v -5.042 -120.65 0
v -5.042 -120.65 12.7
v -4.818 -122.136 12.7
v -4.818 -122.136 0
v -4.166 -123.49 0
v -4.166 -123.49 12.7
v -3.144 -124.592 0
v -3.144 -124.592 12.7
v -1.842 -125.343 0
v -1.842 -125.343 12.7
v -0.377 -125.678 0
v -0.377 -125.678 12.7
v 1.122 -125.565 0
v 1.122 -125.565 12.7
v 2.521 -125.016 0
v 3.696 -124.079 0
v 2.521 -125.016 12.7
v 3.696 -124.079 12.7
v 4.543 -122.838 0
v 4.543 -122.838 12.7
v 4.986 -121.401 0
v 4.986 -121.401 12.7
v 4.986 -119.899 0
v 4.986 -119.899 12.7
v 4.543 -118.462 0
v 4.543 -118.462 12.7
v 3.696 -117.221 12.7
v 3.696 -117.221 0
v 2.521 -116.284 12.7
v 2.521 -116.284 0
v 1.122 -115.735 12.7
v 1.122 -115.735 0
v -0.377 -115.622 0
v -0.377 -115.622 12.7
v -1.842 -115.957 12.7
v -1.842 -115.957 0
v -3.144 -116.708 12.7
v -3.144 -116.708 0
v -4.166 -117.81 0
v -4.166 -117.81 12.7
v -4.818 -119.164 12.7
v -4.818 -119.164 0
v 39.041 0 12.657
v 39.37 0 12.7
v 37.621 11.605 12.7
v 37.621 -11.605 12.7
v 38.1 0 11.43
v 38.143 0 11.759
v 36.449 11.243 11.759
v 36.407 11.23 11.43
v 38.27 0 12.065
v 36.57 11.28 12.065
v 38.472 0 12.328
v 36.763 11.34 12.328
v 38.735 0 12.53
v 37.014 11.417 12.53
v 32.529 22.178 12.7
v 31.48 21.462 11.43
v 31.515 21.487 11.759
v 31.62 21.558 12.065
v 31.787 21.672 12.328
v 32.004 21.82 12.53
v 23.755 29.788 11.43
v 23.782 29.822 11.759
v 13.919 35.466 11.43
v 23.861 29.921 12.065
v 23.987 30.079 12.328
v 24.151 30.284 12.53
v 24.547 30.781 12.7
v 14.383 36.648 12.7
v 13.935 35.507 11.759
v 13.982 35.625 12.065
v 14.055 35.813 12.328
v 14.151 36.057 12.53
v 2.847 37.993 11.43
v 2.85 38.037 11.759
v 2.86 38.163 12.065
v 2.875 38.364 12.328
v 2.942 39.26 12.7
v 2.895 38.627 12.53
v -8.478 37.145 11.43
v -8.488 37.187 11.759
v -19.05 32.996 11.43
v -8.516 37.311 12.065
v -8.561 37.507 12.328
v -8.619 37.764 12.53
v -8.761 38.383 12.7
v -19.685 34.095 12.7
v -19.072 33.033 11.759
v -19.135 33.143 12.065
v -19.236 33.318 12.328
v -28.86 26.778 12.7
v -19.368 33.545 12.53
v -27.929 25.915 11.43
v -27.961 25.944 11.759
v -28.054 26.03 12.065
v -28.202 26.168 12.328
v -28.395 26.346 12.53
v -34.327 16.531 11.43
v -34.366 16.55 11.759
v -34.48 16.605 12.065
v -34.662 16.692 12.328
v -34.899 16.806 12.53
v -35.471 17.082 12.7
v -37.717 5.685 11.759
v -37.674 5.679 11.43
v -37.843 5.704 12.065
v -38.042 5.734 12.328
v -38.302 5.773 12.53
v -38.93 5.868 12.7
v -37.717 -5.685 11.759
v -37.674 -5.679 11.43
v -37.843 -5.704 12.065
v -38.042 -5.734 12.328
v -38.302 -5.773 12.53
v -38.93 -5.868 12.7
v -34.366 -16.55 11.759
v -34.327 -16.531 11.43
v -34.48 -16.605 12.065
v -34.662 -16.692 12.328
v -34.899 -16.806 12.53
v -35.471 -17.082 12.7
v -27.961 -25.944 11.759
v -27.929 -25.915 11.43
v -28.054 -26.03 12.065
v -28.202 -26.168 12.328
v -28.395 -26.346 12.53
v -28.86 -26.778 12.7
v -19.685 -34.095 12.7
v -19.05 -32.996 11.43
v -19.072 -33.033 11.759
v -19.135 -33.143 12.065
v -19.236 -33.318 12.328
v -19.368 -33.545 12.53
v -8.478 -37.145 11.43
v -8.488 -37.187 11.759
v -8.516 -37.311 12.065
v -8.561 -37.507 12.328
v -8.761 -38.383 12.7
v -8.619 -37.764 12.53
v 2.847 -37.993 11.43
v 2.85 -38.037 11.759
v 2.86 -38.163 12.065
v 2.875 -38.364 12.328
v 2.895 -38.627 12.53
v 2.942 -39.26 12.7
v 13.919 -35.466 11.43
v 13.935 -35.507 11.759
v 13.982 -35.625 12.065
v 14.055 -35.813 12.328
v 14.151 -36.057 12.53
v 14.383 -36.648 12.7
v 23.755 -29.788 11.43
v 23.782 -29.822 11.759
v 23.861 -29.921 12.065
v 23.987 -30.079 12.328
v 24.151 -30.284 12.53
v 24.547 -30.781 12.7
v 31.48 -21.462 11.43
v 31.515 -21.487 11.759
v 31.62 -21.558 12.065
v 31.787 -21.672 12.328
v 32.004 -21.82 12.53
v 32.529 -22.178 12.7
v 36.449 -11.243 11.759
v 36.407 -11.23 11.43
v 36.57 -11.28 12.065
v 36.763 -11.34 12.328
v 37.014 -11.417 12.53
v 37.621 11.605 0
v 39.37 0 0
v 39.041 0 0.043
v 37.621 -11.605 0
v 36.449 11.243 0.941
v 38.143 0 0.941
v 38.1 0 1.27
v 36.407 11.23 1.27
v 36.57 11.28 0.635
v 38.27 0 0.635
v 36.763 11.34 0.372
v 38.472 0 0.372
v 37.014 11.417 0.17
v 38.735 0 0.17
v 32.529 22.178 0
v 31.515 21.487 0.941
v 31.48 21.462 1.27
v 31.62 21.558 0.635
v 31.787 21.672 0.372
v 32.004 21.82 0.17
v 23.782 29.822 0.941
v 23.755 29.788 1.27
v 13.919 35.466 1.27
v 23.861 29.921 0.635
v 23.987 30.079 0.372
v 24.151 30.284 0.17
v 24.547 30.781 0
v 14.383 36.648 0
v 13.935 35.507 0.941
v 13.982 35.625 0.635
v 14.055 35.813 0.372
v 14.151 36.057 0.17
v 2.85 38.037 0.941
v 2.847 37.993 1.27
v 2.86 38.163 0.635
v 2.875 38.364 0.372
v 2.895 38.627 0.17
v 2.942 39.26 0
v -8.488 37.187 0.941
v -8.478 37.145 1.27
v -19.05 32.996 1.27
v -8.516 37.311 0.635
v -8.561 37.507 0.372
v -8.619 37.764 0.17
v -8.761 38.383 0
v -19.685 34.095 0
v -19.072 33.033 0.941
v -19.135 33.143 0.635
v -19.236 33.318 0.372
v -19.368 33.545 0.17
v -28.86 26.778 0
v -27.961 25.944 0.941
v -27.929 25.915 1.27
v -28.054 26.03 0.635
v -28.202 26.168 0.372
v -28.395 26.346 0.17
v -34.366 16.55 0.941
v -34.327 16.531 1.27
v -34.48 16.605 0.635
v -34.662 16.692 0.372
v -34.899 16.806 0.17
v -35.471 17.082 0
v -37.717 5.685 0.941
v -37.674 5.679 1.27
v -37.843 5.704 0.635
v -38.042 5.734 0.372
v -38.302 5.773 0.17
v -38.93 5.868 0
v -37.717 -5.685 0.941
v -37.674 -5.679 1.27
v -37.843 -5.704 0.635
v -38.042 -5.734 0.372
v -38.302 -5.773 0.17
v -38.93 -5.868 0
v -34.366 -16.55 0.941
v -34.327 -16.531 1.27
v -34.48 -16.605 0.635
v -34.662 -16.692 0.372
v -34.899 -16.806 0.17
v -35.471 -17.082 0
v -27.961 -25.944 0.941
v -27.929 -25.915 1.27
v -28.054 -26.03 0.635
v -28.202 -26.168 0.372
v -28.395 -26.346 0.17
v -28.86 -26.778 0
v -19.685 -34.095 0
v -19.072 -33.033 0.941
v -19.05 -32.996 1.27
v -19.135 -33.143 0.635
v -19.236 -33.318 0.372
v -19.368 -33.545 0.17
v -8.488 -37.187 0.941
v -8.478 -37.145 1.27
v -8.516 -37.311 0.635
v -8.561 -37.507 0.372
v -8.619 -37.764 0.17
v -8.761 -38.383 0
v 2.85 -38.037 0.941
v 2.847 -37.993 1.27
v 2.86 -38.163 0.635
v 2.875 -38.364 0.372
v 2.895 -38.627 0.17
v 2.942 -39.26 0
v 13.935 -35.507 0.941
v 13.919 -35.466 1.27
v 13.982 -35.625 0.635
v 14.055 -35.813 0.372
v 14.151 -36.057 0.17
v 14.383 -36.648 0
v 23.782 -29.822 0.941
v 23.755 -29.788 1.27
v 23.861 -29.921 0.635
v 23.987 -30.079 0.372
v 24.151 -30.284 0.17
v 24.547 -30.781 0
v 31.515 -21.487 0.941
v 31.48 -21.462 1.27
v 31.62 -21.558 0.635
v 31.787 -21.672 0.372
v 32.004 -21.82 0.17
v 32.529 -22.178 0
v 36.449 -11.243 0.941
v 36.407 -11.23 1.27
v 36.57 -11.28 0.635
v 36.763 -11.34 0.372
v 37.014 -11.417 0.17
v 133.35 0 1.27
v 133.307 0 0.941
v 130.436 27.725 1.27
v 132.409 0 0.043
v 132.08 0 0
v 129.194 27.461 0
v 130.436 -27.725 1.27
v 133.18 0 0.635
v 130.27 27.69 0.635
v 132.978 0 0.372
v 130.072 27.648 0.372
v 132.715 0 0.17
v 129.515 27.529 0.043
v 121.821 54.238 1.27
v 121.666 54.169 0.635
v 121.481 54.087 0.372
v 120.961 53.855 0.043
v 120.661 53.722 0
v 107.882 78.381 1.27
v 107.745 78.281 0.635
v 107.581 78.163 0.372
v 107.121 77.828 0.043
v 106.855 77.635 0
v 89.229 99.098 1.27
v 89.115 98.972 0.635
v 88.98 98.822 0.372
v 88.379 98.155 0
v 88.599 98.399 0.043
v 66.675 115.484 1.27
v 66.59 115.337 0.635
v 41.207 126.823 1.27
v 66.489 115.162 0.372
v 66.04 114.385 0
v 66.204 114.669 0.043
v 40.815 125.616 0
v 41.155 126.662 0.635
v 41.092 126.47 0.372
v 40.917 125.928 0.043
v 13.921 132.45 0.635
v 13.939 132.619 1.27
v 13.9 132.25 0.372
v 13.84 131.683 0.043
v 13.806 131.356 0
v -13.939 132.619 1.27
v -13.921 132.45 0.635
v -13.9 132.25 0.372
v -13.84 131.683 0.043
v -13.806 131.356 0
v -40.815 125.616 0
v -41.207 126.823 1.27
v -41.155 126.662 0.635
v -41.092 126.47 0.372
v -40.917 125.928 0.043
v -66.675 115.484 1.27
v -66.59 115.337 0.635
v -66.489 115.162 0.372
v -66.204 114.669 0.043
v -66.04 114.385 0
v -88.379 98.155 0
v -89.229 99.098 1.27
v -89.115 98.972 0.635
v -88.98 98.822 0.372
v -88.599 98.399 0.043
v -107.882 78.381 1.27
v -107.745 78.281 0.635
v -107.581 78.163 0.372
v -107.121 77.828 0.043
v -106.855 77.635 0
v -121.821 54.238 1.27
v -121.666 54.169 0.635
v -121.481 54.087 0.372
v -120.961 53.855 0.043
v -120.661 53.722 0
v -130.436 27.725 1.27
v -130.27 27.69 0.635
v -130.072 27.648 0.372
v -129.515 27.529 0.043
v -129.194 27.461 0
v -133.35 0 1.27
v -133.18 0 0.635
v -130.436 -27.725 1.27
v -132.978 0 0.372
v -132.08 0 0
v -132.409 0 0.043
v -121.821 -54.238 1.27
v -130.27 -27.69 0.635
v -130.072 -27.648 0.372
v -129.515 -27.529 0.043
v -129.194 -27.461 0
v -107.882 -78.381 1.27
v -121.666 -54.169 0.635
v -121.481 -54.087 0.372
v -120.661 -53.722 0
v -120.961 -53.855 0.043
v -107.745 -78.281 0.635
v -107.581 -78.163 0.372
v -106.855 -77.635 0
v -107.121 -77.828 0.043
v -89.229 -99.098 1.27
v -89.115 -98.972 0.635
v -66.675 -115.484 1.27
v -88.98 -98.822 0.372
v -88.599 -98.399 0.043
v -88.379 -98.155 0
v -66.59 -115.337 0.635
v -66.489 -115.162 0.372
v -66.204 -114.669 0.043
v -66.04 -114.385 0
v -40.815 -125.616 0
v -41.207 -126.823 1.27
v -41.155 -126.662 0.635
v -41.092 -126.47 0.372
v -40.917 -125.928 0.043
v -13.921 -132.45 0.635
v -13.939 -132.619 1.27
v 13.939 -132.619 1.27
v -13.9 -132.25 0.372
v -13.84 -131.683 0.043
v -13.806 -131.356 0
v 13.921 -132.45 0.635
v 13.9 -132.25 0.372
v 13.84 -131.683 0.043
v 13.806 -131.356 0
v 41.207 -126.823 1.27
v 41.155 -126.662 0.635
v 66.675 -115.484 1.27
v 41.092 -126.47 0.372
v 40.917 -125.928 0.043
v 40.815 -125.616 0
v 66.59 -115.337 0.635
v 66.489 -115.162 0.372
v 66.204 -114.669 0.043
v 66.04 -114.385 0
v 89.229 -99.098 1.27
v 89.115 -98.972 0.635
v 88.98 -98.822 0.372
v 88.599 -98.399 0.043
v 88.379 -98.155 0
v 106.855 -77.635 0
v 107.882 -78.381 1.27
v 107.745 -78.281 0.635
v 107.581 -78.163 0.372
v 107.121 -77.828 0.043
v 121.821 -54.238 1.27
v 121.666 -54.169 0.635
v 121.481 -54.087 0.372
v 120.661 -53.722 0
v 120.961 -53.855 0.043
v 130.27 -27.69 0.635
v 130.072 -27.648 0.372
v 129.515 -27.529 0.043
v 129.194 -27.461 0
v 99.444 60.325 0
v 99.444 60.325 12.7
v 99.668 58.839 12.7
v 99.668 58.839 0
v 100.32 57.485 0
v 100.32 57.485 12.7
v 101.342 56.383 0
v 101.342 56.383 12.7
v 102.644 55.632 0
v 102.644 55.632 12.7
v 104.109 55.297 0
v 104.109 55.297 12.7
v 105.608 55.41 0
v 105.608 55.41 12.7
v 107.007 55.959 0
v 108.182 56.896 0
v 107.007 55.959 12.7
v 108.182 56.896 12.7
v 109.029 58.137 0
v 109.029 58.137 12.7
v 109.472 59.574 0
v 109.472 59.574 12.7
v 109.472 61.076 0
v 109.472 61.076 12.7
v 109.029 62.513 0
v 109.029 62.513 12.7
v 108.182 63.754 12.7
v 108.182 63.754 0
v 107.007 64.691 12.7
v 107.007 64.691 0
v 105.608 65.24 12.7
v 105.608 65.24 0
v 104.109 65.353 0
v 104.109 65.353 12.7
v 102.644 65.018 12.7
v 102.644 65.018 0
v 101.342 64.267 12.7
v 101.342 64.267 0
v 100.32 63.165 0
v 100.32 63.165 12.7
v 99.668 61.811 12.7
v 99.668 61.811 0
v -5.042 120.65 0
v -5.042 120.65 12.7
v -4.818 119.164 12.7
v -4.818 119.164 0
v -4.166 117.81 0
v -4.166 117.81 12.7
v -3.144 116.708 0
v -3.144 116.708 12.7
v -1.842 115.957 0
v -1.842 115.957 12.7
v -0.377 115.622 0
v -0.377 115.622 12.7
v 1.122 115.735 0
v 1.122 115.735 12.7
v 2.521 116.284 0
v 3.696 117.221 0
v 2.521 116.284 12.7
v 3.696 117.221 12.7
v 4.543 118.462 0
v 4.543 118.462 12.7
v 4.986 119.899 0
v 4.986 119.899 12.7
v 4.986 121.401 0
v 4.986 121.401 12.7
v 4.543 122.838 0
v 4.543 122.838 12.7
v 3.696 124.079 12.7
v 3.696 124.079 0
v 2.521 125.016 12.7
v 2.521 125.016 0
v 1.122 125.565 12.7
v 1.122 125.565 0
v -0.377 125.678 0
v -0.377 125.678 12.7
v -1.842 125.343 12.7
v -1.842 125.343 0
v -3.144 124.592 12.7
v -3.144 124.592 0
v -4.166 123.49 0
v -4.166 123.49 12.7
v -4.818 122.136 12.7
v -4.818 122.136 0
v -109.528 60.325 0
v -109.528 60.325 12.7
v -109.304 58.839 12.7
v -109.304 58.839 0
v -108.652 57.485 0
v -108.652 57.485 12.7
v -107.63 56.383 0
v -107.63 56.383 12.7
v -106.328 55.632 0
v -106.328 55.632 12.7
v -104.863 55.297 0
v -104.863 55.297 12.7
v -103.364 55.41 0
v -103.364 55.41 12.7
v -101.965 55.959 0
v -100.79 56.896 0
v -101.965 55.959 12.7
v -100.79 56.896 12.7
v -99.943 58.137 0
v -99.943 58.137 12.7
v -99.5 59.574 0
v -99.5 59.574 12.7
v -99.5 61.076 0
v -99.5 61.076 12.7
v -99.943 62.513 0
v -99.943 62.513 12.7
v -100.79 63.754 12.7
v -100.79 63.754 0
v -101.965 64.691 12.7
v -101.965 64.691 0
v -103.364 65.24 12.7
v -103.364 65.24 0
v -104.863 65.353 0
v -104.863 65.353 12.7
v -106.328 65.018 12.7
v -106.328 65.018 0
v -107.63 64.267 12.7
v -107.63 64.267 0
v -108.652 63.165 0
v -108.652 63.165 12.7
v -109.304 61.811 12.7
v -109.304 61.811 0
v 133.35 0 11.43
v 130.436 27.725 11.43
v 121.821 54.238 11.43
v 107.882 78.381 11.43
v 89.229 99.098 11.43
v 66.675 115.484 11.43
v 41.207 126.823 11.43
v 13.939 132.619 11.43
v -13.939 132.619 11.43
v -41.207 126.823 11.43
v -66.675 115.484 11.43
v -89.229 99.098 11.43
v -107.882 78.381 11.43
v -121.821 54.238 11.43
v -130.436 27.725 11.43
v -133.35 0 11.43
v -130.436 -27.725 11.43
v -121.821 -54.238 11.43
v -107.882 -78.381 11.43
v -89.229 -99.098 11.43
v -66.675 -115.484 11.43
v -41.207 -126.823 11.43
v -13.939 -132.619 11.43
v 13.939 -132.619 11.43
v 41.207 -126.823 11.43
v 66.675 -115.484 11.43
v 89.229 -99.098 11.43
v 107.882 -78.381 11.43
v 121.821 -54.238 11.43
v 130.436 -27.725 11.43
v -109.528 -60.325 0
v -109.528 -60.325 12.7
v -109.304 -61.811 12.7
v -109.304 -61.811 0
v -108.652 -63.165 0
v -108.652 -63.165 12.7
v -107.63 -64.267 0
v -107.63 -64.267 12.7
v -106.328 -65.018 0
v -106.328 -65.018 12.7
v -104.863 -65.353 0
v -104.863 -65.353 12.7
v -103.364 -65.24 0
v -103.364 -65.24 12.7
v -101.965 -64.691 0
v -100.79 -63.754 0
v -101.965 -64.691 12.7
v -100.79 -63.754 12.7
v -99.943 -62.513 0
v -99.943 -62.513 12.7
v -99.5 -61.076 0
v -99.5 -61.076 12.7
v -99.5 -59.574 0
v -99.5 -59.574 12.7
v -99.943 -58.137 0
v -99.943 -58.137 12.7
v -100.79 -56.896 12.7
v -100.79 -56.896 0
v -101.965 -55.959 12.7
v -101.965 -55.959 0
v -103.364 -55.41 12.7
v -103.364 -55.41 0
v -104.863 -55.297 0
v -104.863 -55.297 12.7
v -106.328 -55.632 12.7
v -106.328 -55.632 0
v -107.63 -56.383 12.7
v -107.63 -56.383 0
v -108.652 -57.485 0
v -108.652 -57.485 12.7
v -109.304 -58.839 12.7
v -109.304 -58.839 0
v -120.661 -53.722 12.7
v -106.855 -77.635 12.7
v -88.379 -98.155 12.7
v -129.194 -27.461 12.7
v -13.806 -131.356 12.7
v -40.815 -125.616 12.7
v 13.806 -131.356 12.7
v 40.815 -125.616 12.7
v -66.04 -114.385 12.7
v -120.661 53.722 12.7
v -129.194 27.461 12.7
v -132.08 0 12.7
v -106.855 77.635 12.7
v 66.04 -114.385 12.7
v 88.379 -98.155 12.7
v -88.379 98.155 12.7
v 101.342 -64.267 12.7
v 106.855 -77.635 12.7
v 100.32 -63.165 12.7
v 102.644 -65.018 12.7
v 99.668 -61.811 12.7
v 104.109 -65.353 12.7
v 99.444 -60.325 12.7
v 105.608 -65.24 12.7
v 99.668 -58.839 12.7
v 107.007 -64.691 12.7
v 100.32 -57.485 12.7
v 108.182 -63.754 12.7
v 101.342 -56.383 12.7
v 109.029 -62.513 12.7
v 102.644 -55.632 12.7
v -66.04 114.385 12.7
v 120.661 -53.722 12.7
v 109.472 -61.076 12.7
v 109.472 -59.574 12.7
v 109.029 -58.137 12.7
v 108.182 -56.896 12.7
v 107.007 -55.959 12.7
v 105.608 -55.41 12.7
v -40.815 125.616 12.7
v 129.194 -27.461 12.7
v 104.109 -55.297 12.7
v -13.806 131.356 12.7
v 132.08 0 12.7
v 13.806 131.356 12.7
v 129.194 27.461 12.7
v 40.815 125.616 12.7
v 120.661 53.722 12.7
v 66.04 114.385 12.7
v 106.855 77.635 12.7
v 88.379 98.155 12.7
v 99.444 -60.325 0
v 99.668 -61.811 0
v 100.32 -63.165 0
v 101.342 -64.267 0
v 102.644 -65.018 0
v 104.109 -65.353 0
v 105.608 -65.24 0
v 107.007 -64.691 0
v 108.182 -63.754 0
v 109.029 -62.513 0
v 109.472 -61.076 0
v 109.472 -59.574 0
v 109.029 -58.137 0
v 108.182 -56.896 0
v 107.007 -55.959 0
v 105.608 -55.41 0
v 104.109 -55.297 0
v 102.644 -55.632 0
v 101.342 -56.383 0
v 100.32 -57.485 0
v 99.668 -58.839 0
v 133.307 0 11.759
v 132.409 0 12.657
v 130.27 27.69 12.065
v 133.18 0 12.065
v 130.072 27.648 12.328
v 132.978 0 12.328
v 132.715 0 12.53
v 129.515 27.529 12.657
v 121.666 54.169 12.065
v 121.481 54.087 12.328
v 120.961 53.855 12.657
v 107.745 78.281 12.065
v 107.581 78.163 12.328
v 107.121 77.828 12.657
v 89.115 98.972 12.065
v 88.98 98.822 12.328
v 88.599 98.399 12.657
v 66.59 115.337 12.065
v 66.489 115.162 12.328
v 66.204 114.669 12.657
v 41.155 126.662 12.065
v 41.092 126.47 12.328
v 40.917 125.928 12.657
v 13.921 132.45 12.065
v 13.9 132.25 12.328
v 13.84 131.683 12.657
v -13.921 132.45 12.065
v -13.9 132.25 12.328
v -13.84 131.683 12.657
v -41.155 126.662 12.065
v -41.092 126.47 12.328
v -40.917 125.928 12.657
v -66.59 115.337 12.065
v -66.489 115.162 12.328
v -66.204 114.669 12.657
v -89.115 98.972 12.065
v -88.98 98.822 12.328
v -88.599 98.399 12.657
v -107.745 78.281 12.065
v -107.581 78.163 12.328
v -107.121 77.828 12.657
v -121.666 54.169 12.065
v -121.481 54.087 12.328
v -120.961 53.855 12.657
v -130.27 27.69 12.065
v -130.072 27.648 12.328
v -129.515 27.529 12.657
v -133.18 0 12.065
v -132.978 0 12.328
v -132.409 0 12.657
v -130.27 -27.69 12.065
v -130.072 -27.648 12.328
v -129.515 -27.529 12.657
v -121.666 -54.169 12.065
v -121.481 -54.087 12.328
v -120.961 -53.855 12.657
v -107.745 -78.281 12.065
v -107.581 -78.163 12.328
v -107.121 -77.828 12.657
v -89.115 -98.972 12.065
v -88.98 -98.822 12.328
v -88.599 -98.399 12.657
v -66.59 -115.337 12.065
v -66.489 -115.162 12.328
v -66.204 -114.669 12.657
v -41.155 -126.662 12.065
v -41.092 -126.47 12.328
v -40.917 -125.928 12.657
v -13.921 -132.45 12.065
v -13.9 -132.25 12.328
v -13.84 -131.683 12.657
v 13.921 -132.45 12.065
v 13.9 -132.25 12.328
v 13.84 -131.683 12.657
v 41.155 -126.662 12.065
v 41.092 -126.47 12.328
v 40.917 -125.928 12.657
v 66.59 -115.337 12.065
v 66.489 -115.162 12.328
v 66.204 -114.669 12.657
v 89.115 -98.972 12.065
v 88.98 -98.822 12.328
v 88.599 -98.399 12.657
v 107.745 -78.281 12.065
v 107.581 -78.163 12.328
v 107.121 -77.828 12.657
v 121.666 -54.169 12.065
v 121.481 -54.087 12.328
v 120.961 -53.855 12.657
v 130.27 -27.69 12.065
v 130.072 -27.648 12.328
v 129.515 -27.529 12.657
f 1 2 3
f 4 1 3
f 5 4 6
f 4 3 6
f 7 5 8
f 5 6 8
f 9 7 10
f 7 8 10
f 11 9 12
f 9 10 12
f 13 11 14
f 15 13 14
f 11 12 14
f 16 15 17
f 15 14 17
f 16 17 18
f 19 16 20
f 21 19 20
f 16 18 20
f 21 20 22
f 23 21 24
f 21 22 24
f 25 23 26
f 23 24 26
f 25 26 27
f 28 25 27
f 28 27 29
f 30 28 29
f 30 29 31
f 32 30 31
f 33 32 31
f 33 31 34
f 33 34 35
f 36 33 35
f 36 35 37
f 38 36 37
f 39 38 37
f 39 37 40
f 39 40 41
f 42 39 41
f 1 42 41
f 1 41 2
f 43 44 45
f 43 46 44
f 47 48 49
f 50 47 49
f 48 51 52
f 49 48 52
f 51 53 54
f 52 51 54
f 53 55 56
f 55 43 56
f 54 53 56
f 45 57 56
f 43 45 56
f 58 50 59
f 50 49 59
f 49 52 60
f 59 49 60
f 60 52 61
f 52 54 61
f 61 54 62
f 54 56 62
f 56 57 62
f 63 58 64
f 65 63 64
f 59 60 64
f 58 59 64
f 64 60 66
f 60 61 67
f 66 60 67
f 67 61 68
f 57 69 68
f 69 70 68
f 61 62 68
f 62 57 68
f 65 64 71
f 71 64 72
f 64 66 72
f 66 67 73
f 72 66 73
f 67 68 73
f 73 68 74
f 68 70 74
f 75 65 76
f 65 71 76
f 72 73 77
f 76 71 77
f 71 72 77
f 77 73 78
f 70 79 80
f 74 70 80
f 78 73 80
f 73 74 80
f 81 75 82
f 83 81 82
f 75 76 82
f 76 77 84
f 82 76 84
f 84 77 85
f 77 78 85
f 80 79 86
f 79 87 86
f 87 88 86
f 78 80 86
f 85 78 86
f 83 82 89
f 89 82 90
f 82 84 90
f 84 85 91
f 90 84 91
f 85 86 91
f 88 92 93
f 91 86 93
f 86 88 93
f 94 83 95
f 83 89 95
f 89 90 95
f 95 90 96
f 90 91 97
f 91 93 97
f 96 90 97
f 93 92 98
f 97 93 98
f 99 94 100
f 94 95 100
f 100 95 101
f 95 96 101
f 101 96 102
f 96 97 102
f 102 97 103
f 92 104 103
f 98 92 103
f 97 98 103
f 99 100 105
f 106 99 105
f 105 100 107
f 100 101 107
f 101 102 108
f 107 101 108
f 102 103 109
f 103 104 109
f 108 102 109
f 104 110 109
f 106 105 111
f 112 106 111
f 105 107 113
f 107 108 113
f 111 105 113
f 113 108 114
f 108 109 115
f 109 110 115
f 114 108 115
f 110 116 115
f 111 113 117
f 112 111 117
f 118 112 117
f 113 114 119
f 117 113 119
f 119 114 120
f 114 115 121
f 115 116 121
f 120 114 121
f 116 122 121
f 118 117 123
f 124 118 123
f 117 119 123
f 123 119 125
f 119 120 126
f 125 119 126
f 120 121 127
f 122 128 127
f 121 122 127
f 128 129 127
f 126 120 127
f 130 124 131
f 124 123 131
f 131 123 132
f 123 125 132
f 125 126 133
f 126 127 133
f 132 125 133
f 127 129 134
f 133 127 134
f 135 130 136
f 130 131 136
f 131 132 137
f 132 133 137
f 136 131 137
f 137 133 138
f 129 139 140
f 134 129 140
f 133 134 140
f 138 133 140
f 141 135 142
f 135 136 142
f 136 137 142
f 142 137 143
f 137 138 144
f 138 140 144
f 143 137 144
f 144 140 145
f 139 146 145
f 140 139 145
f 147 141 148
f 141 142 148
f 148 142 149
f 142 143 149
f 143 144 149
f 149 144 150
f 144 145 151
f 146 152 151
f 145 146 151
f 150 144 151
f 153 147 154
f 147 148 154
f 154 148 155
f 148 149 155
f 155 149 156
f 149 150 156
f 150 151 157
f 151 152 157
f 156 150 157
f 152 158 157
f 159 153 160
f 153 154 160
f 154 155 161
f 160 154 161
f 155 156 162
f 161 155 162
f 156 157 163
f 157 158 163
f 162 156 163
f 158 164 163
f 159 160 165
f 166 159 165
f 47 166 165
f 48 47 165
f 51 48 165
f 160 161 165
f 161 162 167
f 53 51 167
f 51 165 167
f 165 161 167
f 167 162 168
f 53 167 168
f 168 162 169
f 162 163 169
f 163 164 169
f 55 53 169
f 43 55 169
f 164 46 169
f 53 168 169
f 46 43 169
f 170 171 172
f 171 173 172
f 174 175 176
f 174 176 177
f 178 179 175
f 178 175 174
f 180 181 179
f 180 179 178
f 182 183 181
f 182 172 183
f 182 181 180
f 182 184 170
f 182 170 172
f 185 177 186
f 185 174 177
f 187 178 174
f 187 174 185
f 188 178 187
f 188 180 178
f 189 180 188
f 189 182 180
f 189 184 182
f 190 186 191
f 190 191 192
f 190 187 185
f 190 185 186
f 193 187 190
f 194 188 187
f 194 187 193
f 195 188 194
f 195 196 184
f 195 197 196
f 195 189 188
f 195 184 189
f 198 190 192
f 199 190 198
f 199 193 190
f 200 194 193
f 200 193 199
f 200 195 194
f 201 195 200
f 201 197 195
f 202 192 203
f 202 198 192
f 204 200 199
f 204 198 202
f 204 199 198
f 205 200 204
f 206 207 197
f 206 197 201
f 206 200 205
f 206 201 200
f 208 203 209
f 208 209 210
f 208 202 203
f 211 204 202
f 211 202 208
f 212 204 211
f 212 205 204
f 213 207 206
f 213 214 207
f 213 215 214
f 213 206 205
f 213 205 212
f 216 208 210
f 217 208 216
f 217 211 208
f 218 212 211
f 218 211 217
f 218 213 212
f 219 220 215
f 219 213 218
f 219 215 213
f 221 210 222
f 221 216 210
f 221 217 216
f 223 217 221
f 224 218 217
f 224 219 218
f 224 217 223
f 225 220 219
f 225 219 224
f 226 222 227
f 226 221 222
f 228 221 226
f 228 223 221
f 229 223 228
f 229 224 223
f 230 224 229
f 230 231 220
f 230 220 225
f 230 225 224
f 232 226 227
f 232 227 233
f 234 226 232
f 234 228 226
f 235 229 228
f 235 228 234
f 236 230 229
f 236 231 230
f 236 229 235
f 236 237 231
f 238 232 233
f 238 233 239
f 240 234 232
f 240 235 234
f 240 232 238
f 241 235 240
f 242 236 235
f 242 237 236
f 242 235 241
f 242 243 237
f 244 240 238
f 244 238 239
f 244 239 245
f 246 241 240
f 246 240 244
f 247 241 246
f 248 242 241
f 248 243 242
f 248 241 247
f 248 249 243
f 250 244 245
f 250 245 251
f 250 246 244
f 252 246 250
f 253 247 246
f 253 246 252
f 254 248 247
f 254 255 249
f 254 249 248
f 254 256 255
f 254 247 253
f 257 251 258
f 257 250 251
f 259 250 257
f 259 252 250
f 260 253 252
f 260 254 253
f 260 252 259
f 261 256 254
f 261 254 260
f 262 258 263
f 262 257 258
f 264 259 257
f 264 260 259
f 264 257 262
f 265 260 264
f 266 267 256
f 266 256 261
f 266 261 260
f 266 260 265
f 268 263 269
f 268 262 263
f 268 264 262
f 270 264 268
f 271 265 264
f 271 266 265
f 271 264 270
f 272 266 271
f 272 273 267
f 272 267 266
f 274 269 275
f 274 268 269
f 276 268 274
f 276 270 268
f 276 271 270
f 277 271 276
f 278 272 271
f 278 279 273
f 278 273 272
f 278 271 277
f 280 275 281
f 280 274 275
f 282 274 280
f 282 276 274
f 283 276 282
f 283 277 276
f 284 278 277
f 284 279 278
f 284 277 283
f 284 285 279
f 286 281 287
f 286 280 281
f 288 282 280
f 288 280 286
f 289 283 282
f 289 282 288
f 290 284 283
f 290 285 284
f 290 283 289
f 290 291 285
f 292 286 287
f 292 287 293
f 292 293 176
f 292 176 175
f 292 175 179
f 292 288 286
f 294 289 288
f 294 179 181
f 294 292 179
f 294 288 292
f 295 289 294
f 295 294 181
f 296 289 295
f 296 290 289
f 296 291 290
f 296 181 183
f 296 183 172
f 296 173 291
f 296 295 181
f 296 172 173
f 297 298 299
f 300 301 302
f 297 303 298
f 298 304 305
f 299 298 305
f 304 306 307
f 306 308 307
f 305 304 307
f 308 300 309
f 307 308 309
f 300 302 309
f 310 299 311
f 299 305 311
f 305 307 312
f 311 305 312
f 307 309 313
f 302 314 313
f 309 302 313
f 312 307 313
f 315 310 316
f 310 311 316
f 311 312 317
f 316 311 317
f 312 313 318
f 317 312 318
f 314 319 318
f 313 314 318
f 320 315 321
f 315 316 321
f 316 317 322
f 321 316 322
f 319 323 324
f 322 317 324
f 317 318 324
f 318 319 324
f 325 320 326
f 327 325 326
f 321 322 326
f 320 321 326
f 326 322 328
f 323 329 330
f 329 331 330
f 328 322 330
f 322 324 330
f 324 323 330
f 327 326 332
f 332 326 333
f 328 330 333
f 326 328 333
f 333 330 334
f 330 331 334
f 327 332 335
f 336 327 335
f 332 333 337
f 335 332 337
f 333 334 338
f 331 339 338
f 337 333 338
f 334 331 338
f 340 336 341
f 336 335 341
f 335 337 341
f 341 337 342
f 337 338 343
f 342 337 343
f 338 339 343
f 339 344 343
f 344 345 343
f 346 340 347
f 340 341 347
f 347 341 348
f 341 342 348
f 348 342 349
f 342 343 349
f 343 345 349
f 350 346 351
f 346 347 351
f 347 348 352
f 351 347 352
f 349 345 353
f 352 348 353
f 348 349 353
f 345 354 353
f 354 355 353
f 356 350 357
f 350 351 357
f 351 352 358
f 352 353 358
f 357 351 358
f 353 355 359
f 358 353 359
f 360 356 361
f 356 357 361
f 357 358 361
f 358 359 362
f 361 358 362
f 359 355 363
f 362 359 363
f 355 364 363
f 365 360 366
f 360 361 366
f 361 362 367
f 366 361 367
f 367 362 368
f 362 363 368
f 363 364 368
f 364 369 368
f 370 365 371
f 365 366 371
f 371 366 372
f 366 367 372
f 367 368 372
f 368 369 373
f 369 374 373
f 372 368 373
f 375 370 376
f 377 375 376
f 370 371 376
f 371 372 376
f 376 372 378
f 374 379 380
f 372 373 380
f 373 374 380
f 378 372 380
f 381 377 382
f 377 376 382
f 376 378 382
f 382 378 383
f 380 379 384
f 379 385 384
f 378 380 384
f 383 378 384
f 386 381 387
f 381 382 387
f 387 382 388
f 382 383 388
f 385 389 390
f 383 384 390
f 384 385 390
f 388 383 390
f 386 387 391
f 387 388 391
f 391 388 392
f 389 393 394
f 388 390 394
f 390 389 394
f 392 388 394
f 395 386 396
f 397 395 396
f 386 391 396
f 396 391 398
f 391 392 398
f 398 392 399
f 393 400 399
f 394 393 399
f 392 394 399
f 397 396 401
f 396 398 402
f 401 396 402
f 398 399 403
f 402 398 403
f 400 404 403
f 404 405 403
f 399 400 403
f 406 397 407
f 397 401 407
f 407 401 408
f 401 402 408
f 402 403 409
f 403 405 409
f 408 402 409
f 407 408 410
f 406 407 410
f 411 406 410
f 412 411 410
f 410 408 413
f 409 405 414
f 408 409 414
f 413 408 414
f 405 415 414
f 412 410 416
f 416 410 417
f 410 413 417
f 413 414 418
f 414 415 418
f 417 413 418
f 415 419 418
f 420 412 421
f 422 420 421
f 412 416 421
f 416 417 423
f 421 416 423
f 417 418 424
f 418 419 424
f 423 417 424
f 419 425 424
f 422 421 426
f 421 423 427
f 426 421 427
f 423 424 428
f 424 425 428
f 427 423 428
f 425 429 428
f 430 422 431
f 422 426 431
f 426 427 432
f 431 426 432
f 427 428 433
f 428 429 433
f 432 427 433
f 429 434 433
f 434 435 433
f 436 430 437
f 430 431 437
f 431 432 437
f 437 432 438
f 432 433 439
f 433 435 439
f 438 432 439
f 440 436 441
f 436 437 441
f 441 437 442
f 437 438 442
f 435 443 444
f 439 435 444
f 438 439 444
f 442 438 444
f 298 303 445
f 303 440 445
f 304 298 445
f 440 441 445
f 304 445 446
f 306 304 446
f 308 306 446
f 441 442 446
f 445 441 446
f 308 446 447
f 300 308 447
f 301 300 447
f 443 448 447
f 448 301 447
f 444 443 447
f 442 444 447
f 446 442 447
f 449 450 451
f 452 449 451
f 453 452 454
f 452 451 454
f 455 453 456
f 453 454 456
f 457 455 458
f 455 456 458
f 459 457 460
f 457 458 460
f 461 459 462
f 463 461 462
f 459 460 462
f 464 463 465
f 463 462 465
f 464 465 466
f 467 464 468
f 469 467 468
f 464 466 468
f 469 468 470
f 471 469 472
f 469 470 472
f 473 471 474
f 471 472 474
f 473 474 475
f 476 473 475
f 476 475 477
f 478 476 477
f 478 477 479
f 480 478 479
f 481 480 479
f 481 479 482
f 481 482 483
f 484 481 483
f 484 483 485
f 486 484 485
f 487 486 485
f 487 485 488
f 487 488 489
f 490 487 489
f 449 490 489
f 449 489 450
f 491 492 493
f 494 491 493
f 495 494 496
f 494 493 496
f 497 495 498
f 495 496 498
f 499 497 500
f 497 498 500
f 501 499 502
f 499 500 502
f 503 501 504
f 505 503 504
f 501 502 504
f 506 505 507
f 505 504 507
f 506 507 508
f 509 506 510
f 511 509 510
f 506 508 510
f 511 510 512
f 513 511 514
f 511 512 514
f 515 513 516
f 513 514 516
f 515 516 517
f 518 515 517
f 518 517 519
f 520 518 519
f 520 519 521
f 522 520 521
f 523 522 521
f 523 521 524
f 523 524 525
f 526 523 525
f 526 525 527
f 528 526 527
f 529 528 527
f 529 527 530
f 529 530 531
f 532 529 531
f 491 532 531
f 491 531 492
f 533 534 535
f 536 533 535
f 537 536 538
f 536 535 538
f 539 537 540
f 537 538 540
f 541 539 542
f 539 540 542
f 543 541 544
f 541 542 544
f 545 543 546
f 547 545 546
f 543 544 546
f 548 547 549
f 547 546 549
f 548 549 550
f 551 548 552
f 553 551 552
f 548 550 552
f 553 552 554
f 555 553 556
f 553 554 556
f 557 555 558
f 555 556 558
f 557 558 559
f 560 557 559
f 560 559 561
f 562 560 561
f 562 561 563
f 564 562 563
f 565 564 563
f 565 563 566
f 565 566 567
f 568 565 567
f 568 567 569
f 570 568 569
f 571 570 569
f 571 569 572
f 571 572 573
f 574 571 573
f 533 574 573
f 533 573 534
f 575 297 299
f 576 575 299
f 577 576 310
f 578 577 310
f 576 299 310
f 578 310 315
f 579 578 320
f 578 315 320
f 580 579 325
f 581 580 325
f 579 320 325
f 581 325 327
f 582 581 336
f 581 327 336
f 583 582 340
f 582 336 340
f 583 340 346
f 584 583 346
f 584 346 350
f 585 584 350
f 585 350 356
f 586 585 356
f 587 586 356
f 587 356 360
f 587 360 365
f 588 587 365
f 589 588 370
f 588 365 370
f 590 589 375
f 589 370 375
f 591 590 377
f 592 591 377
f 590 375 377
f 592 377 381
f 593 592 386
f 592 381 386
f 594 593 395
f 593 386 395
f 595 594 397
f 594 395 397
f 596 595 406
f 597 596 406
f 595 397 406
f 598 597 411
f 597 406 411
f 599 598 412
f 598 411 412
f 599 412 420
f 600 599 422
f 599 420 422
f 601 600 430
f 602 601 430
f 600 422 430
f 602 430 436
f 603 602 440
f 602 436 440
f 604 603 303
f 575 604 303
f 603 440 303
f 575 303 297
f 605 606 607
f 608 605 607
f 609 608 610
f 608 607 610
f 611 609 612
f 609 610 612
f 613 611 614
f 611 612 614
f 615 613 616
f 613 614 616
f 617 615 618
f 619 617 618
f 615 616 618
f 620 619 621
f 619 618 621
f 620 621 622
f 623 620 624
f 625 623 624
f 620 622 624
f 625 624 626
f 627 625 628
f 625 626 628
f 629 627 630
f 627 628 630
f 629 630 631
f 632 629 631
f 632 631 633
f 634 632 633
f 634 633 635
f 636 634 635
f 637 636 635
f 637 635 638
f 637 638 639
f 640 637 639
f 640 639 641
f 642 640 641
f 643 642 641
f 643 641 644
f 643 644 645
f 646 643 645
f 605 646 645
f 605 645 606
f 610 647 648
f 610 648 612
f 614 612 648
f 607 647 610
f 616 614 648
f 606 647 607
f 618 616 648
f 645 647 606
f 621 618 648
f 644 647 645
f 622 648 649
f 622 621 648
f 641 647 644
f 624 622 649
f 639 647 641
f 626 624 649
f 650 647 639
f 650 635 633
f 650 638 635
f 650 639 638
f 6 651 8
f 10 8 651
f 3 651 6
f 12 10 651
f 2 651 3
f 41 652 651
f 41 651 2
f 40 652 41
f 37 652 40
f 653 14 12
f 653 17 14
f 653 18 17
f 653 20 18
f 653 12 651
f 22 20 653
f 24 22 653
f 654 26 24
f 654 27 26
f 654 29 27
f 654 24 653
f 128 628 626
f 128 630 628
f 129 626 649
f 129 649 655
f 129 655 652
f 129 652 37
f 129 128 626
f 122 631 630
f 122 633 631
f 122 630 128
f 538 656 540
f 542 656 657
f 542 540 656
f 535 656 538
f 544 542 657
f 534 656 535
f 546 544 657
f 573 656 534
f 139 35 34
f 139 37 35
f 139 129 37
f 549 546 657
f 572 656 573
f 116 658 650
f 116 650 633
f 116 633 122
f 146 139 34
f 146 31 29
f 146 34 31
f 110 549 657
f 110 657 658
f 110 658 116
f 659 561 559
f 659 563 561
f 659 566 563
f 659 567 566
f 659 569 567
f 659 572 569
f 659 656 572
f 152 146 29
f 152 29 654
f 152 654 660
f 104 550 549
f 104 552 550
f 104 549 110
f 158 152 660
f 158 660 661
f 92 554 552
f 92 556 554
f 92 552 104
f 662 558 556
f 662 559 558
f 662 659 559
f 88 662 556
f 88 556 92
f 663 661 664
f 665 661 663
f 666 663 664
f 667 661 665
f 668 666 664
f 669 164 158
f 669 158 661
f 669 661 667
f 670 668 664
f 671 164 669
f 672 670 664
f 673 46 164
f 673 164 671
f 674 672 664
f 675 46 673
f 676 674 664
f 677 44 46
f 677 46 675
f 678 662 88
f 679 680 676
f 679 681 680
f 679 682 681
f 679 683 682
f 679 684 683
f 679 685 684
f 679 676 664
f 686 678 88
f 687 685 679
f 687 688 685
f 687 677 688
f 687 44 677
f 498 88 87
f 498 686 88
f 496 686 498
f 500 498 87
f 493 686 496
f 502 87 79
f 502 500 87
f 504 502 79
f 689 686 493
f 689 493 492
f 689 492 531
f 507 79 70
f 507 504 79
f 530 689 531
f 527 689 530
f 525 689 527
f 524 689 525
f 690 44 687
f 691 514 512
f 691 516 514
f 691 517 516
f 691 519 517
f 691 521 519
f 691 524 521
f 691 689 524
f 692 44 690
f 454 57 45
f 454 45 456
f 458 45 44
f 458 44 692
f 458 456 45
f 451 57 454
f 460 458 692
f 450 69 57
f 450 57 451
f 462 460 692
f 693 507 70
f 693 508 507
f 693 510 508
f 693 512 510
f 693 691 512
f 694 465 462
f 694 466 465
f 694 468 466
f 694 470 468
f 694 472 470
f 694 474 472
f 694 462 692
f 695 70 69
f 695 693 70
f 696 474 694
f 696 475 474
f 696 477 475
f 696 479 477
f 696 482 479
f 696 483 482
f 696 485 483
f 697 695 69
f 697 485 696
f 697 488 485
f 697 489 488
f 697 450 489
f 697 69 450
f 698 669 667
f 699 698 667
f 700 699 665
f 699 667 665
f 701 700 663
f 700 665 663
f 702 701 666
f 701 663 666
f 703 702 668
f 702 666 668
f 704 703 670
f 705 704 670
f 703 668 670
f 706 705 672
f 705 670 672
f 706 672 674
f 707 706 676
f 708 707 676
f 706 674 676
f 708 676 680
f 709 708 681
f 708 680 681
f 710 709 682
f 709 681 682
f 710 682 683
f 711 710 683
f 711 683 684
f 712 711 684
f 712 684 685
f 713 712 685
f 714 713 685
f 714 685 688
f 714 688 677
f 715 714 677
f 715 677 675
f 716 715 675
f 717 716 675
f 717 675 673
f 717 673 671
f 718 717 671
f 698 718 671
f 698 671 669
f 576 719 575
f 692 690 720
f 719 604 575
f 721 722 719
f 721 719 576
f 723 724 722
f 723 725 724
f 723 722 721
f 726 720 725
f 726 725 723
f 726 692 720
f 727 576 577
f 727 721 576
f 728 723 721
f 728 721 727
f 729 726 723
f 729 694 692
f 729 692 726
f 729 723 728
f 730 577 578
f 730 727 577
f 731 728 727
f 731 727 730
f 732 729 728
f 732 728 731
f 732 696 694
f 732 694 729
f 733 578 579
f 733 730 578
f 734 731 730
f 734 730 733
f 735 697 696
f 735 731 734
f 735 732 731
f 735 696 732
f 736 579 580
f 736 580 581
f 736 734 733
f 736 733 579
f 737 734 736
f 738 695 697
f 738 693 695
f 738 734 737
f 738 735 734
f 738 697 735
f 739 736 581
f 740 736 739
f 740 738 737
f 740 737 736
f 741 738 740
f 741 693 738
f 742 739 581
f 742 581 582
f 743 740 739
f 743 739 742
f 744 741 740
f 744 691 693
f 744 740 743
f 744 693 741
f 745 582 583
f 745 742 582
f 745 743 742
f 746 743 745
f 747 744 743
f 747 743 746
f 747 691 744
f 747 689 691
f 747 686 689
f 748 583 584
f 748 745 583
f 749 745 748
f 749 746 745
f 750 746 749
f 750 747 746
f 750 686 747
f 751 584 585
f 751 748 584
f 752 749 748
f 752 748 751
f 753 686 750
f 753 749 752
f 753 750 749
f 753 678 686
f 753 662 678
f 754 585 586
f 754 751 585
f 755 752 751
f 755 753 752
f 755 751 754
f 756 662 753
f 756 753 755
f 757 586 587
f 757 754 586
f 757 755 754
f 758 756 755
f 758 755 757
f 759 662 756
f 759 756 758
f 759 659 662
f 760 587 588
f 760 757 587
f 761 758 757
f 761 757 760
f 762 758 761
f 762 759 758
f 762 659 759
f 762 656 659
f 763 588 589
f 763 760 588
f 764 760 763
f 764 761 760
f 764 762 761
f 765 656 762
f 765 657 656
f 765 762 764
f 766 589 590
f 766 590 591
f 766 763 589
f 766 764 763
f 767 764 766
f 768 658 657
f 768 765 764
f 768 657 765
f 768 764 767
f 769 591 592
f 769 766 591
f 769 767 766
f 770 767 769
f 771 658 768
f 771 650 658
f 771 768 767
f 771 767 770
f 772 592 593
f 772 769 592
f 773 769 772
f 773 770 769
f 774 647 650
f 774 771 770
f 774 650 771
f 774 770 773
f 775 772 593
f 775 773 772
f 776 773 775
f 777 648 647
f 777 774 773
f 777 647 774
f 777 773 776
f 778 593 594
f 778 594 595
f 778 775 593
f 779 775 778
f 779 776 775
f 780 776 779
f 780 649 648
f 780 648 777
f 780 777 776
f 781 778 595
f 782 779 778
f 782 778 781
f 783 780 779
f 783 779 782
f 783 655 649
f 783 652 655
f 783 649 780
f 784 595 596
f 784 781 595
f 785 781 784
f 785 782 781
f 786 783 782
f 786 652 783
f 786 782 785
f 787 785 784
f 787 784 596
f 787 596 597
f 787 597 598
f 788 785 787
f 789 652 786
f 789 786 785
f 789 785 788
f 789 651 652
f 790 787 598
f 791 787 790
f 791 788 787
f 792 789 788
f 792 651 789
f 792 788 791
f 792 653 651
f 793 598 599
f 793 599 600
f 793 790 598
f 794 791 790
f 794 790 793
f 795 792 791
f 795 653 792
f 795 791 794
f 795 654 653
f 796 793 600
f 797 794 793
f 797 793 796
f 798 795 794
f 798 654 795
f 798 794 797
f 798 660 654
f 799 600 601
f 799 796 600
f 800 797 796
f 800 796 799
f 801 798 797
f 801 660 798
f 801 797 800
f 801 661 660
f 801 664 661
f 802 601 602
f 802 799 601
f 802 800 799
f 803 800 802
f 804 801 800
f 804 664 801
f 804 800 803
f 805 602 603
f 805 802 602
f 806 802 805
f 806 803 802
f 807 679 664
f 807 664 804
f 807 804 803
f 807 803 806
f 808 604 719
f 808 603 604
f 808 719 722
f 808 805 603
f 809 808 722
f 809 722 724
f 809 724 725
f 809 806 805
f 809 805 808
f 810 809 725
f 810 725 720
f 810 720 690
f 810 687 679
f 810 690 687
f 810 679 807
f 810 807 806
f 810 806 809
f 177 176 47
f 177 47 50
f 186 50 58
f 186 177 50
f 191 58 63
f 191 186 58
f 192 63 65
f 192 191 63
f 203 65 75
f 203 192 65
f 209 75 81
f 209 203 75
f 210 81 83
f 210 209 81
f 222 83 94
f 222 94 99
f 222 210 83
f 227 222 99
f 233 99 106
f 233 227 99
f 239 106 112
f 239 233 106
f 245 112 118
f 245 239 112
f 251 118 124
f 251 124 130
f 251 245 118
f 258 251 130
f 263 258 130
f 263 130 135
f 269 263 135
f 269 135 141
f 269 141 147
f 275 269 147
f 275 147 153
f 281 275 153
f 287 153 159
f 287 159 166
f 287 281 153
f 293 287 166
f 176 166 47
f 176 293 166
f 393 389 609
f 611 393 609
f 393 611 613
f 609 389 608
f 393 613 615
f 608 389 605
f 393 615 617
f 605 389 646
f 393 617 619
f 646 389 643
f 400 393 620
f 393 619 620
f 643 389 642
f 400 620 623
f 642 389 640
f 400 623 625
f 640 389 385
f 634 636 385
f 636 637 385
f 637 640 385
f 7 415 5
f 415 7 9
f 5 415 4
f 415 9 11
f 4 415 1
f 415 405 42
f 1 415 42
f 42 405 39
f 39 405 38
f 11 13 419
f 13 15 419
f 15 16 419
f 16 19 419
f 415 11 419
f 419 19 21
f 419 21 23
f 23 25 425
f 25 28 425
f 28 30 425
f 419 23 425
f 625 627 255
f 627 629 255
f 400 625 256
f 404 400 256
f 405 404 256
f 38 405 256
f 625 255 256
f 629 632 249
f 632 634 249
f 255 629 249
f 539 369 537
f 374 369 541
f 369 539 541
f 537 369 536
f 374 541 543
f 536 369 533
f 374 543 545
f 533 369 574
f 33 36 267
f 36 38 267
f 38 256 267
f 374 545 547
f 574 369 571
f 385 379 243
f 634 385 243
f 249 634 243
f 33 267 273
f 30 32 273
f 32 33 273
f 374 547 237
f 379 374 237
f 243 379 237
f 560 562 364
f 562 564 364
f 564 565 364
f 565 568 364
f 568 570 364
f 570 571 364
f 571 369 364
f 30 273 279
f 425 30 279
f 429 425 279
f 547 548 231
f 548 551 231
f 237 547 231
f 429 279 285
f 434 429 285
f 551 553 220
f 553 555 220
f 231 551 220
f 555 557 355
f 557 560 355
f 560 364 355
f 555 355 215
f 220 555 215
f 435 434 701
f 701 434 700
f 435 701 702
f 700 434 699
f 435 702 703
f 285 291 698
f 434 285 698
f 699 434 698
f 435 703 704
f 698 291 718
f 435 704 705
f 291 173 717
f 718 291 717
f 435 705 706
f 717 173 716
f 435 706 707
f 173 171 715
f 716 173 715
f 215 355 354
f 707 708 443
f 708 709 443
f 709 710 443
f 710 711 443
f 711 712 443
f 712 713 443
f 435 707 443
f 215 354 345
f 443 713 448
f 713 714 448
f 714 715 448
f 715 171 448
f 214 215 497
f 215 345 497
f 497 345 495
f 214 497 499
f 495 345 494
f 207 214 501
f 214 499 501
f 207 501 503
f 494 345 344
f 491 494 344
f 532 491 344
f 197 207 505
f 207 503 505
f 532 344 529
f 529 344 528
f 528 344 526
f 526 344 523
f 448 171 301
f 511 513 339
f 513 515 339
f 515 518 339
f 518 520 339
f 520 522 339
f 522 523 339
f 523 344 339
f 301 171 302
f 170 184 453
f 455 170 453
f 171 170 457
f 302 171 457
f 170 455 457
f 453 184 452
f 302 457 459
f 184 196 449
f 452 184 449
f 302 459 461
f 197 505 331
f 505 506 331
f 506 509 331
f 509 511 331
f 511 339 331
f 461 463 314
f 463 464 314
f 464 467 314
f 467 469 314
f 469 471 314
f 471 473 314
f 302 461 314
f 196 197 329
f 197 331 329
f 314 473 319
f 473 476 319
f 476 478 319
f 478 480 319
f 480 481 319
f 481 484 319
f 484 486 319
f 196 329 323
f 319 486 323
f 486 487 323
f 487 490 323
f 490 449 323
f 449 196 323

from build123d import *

# Parameters (mm, degrees)
F0_R     = 133.35
F0_R_2   = 38.1
F1_DEPTH = 12.7
F2_R     = 1.27
F4_D     = 10.0838


with BuildPart() as f1:
    # F0 (on Top) → F1 (new body)
    with BuildSketch(Plane.XY):
        Circle(F0_R)
        Circle(F0_R_2, mode=Mode.SUBTRACT)
    extrude(amount=F1_DEPTH)

    # F2
    f2_edges = [f1.edges().sort_by_distance(p)[0] for p in [
        (-38.1, 0, 12.7),
        (-38.1, 0, 0),
        (-133.35, 0, 12.7),
        (-133.35, 0, 0),
    ]]
    fillet(f2_edges, radius=F2_R)

    # F4 (through all)
    with Locations(Plane(origin=(0, 0, 0), x_dir=(1, 0, 0), z_dir=(0, 0, -1))):
        with Locations((0, -120.65), (-104.4859649666, -60.325), (-104.4859649666, 60.325), (0, 120.65), (104.4859649666, 60.325), (104.4859649666, -60.325)):
            Hole(F4_D / 2)


solid = f1.part
